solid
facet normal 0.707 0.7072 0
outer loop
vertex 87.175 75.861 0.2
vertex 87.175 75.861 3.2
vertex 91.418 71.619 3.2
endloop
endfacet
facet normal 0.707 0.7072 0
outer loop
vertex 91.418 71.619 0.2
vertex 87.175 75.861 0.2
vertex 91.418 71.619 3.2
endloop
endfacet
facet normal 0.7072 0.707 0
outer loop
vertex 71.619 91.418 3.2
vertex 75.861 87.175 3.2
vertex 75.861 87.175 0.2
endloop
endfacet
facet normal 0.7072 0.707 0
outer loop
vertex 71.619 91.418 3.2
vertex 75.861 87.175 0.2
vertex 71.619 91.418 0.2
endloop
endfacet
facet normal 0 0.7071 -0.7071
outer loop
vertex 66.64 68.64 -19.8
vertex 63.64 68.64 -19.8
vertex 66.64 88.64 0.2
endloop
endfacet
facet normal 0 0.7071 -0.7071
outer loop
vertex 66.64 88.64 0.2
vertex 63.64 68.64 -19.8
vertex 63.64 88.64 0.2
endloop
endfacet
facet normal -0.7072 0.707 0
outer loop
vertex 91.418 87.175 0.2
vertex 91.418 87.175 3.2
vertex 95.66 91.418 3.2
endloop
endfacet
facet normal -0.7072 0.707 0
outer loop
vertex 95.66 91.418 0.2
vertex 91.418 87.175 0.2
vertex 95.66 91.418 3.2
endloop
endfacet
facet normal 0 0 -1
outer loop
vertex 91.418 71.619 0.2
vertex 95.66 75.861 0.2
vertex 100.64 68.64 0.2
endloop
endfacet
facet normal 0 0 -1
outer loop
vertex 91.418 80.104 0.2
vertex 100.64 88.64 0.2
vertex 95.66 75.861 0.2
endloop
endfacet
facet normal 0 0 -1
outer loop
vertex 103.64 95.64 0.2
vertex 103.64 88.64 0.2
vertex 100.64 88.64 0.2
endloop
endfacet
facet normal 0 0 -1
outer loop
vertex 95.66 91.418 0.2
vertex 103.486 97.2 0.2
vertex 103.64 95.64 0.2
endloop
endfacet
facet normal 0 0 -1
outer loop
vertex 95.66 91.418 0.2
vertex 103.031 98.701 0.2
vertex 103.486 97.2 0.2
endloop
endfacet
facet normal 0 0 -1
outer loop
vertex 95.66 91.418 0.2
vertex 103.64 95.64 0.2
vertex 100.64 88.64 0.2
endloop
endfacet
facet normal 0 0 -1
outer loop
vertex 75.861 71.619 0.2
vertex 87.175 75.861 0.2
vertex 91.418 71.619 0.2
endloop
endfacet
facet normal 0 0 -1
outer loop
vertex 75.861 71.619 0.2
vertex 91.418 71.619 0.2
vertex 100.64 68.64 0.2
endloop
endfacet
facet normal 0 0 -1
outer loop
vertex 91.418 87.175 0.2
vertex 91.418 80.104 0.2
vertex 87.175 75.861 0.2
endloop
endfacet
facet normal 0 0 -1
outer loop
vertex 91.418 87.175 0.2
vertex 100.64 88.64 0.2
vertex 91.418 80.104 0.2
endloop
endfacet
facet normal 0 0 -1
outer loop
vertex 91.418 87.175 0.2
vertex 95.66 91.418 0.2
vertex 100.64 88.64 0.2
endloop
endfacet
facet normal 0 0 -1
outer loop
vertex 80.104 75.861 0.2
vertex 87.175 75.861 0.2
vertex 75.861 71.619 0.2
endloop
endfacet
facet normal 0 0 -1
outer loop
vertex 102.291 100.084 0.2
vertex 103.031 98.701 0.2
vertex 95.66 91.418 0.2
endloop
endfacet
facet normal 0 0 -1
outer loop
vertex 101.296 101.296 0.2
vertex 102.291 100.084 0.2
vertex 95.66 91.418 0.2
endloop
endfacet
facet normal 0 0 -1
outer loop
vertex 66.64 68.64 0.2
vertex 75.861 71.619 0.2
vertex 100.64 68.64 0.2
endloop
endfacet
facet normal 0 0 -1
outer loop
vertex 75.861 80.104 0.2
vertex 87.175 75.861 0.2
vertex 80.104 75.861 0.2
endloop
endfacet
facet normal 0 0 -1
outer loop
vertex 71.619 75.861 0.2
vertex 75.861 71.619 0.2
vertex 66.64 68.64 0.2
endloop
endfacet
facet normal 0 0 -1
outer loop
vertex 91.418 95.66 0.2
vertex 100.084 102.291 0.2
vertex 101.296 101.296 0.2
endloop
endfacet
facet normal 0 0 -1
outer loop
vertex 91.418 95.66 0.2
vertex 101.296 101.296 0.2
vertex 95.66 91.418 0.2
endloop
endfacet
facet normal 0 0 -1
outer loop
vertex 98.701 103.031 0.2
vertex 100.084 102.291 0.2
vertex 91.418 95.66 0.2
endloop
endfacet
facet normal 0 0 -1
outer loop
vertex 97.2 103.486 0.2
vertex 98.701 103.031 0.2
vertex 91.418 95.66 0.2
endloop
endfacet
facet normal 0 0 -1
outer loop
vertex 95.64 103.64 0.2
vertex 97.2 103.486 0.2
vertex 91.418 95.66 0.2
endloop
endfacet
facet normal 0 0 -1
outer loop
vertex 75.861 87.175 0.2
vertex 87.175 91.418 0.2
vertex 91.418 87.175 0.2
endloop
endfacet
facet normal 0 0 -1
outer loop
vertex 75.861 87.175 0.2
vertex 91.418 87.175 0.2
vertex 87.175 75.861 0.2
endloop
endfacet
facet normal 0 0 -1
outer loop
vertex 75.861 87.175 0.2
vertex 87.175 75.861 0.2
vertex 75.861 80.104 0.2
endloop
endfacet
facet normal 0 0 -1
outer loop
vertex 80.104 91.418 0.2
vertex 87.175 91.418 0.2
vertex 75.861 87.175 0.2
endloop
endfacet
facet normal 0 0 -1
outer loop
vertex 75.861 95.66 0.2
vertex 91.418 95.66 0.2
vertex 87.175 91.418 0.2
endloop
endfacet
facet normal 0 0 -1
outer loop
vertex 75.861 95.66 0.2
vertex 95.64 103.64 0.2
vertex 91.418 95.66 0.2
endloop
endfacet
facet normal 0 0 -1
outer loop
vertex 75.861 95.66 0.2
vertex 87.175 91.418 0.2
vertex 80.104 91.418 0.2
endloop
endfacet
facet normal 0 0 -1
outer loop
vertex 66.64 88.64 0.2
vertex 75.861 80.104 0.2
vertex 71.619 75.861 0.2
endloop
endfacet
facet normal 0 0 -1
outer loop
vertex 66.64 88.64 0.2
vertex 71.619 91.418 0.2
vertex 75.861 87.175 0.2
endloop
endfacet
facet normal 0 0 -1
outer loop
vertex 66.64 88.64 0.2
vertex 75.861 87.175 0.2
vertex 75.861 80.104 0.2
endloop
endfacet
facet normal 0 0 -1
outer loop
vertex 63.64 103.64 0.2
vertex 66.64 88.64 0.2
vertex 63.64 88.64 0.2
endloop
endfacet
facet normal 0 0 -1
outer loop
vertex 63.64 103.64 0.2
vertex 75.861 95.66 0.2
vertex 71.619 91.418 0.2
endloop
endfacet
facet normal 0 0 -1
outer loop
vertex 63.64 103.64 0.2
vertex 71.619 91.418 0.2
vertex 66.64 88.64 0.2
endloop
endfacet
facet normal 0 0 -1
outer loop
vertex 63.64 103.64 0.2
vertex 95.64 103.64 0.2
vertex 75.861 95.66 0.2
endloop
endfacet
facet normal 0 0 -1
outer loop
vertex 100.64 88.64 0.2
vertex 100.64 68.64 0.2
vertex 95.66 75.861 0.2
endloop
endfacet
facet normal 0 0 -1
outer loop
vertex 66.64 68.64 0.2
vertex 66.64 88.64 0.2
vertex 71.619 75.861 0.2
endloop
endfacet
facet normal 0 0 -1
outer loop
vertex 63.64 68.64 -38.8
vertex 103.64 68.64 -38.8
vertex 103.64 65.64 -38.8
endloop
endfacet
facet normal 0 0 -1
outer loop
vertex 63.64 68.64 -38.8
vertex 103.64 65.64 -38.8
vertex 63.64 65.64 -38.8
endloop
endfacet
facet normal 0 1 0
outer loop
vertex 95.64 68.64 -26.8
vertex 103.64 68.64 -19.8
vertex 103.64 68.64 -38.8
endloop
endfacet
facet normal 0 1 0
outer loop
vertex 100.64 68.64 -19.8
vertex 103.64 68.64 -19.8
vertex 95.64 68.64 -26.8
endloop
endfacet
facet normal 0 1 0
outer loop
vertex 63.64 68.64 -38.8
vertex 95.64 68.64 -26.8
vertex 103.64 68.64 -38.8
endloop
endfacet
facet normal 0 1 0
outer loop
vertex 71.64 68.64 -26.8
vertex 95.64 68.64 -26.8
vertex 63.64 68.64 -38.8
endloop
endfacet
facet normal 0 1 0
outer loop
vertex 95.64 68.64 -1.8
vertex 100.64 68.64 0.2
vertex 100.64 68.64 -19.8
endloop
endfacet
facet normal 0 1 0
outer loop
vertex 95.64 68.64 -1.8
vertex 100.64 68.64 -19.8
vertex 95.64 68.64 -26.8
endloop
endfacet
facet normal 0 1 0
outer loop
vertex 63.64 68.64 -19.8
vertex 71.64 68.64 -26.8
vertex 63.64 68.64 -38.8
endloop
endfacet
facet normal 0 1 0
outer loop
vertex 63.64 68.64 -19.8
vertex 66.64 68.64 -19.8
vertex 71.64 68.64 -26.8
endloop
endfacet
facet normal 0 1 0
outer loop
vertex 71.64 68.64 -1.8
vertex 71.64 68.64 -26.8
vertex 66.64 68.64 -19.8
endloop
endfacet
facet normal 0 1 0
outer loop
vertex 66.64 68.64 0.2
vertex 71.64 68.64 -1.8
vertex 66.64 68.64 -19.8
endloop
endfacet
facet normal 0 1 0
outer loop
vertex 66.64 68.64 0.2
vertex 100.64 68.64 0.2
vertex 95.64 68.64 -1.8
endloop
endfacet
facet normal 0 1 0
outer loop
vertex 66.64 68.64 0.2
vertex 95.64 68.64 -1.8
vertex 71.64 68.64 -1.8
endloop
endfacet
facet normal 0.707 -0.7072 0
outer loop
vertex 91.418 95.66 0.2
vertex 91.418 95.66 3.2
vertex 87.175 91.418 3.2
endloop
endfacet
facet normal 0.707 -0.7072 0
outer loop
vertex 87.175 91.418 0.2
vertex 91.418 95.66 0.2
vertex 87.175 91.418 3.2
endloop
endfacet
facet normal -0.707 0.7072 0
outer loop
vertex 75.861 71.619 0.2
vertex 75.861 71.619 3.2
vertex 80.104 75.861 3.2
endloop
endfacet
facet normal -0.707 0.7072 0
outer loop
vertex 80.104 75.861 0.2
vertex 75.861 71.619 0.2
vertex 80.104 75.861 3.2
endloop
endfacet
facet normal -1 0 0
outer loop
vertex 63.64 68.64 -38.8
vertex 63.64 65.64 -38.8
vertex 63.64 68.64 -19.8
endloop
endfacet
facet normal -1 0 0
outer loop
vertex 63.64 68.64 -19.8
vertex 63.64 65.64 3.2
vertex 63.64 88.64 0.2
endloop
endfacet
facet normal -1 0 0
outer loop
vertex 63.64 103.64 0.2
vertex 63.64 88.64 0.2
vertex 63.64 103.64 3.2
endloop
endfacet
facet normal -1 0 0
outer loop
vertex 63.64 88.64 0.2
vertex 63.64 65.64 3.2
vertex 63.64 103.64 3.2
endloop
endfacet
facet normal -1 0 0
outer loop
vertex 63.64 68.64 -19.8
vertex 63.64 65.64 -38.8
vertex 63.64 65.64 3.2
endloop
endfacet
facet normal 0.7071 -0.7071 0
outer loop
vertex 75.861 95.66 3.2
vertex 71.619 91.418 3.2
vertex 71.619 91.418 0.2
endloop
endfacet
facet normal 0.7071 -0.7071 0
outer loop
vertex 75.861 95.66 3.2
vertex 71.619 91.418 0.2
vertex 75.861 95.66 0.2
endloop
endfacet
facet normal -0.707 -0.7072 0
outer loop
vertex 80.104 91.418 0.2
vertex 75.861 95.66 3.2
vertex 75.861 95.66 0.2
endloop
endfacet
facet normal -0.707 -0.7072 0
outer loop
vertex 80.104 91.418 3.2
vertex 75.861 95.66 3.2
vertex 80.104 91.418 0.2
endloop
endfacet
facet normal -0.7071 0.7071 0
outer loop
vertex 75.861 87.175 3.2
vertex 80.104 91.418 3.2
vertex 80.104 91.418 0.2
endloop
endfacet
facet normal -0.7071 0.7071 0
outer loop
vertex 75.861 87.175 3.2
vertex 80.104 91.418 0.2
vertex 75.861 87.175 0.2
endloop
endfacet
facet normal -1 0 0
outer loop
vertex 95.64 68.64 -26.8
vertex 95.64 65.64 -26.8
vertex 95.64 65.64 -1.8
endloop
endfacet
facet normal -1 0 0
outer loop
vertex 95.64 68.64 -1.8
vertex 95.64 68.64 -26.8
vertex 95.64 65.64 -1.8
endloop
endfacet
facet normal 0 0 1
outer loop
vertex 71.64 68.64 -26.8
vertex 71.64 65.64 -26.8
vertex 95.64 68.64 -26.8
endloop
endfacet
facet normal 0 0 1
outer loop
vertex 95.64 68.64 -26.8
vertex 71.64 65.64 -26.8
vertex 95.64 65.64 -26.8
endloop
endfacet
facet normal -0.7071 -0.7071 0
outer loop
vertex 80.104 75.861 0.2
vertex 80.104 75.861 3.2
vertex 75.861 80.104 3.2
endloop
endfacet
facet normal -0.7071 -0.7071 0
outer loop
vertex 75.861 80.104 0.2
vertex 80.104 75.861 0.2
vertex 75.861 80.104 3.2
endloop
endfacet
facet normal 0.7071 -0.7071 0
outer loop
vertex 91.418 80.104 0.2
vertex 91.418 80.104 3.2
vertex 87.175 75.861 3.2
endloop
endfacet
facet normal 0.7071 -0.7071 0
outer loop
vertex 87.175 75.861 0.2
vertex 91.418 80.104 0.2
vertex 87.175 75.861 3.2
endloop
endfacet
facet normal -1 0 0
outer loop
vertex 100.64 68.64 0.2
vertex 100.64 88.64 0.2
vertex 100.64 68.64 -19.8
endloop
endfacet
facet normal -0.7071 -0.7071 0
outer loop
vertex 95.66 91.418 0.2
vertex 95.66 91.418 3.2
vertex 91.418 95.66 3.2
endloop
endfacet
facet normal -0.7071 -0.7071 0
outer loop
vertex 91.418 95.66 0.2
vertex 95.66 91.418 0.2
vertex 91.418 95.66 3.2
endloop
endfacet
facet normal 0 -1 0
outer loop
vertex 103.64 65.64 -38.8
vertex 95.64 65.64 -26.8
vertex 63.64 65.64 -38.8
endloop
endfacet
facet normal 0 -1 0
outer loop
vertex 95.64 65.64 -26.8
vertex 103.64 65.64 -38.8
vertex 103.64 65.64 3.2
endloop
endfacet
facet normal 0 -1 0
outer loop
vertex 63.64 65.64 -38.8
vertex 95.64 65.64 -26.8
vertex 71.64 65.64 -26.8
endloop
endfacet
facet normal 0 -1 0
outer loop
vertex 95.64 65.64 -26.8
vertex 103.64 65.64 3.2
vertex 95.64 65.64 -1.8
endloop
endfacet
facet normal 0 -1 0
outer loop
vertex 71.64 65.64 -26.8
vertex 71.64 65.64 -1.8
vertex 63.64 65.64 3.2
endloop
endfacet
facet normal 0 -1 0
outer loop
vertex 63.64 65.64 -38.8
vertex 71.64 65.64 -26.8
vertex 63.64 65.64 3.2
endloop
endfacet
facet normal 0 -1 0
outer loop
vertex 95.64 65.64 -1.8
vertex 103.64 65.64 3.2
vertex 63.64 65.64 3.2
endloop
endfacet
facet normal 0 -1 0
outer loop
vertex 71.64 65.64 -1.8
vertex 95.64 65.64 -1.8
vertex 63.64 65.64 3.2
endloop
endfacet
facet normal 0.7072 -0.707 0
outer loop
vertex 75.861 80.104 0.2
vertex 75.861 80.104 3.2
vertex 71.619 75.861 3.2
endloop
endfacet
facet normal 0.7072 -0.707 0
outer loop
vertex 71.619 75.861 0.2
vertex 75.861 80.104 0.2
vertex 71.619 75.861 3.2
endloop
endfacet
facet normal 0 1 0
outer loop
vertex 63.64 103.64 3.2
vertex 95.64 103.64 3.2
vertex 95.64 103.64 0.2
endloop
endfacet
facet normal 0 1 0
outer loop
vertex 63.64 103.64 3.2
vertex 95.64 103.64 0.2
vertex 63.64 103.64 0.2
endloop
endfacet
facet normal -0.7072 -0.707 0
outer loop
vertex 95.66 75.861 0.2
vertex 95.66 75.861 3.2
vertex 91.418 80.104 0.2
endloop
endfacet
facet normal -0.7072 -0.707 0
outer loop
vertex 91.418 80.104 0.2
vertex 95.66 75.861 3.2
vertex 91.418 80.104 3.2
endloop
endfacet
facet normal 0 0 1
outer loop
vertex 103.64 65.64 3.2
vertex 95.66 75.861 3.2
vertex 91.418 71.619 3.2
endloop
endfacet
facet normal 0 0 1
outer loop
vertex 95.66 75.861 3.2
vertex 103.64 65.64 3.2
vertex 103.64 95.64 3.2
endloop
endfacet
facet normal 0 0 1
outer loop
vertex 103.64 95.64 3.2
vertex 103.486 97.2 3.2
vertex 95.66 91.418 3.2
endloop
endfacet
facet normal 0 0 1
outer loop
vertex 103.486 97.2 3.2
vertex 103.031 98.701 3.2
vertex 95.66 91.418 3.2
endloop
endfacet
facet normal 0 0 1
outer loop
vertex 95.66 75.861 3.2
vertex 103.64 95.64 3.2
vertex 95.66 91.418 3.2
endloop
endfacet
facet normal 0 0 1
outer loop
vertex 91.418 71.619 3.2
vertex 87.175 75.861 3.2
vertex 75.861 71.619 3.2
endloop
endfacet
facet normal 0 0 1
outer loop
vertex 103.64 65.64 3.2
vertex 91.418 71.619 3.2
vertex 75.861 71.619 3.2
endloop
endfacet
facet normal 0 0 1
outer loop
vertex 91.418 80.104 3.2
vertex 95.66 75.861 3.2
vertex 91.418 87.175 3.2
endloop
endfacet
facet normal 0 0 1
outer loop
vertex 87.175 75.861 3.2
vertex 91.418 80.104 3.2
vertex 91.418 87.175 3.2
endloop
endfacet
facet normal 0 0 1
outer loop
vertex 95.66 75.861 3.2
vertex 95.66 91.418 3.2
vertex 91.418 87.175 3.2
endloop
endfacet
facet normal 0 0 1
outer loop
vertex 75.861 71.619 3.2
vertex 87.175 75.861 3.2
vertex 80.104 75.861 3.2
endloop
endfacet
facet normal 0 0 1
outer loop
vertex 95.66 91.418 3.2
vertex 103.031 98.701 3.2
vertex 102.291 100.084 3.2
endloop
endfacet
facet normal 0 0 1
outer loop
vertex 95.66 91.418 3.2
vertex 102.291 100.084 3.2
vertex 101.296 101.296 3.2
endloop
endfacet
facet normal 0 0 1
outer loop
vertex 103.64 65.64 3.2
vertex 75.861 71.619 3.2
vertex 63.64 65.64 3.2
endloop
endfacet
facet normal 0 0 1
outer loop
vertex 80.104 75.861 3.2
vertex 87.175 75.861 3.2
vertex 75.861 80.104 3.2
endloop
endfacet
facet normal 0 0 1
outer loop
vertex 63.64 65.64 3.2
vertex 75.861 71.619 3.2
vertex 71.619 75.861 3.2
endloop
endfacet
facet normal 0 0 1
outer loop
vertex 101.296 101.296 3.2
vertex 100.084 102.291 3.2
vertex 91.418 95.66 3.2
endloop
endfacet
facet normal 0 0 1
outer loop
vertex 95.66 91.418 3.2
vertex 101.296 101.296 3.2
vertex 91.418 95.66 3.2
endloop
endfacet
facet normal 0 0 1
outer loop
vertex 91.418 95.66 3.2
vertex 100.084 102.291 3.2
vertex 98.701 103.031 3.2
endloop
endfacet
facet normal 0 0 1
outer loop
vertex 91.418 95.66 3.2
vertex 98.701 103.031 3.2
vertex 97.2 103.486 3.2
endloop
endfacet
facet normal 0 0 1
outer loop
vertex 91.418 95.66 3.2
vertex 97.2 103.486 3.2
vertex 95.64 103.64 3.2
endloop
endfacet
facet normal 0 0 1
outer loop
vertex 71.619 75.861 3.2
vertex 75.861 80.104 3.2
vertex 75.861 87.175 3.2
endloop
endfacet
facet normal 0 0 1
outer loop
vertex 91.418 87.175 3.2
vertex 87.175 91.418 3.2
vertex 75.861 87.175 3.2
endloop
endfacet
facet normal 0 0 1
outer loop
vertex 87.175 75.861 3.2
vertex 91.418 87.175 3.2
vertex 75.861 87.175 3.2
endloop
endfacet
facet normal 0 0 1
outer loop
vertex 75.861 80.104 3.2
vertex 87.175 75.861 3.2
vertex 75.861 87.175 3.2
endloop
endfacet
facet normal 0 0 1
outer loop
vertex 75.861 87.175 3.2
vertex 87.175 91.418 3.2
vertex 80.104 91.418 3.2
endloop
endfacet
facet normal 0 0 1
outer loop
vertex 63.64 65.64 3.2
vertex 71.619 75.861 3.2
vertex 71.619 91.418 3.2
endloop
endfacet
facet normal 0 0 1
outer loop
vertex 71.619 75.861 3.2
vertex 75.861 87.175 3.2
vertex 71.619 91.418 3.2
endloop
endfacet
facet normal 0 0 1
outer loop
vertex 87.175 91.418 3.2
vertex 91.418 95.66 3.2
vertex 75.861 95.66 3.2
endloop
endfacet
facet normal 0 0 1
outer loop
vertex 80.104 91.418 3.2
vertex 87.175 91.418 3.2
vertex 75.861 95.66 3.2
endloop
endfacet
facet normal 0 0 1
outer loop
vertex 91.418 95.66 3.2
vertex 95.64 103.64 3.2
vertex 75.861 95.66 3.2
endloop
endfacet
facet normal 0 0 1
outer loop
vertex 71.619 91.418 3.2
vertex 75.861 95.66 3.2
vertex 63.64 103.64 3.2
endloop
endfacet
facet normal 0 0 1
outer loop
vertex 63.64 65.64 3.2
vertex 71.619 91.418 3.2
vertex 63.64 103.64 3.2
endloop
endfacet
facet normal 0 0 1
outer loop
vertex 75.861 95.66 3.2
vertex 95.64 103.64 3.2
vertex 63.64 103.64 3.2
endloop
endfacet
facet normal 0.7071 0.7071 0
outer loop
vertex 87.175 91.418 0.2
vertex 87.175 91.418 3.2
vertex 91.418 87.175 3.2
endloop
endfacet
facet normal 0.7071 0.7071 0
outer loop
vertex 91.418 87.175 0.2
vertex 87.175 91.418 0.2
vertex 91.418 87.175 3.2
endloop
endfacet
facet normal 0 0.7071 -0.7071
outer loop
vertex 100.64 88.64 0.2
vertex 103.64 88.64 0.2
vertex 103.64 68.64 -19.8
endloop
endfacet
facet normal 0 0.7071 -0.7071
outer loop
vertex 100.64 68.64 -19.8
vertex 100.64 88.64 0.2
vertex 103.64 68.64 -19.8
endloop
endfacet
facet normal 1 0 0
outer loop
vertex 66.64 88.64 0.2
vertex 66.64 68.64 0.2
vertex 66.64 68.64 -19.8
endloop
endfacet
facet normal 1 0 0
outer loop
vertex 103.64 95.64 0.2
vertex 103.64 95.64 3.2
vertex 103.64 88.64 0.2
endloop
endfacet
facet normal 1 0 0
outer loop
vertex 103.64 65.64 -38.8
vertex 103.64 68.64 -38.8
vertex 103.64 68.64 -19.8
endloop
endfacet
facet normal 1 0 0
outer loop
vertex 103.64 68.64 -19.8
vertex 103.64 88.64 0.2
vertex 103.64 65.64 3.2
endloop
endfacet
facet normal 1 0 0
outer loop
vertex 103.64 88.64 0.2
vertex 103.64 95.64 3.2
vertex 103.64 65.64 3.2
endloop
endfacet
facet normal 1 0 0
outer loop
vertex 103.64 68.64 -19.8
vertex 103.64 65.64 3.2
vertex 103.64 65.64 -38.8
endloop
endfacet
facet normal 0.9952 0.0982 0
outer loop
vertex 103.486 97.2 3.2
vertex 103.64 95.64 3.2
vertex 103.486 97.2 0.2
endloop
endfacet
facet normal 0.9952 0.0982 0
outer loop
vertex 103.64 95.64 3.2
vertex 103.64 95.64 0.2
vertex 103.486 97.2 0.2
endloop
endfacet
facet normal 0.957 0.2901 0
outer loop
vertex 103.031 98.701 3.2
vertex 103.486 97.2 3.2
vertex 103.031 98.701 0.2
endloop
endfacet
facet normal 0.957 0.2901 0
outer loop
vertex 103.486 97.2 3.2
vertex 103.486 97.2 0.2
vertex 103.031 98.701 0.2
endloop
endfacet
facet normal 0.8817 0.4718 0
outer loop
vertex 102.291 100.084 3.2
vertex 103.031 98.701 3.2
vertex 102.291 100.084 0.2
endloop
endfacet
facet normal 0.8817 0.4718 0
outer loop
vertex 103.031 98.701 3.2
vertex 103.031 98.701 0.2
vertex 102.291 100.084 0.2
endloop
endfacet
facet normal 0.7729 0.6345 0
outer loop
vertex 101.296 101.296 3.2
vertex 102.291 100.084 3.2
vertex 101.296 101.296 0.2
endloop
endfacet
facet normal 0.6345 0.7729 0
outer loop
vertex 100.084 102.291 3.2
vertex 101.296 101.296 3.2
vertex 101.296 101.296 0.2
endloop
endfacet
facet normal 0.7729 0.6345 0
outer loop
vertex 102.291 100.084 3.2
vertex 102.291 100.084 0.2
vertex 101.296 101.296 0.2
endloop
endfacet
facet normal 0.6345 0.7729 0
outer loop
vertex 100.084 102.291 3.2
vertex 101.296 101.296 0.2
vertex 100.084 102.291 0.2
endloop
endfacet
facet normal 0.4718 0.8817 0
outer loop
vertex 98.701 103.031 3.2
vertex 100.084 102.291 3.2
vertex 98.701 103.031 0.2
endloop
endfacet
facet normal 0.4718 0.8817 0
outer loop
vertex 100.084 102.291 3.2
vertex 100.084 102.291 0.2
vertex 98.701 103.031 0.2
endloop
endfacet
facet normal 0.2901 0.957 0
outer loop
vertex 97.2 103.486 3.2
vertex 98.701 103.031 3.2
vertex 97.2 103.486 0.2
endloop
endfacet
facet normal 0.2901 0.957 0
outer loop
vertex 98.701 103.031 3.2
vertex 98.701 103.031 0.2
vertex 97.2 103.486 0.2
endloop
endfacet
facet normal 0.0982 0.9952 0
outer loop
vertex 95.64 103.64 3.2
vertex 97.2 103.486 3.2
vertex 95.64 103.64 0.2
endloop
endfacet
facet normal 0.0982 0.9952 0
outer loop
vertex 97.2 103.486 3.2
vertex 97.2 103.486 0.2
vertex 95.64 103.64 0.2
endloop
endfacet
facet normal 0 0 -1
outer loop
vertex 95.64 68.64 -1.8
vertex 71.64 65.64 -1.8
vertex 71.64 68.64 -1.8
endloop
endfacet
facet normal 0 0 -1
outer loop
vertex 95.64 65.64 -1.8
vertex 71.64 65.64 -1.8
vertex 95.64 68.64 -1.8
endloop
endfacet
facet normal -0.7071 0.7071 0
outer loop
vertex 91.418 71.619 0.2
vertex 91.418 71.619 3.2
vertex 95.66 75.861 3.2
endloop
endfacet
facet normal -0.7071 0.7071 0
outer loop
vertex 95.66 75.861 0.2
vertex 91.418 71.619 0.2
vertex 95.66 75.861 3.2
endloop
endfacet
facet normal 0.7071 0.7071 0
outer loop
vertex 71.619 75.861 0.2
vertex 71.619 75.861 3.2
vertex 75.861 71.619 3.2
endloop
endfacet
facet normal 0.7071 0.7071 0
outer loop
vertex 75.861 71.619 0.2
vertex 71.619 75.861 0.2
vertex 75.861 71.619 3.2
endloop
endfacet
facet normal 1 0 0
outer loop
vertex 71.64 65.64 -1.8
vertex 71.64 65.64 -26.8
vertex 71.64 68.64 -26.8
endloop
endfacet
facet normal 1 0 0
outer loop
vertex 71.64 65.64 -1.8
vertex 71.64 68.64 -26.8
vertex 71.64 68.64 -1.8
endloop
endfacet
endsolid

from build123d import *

# Parameters (mm, degrees)
SKETCH027_W             = 40
SKETCH027_H             = 38
PAD018_DEPTH            = 3
SKETCH028_W             = 40
SKETCH028_H             = 3
PAD019_DEPTH            = 39
SKETCH029_R             = 1.5
SKETCH029_W             = 24
SKETCH029_H             = 25
POCKET009_DEPTH         = 5
POCKET010_DEPTH         = 5
PAD020_DEPTH            = 3
PAD021_DEPTH            = 3
FILLET012_R             = 8
BODY006_PLACEMENT_ANGLE = 180


with BuildPart() as part:
    # Sketch027 (on Face1 of Binder004) → Pad018 (new body)
    with BuildSketch(Plane(origin=(0, 0, 3.2), x_dir=(1, 0, 0), z_dir=(0, 0, -1))):
        with Locations((-83.6396103068, 84.6396103068)):
            Rectangle(SKETCH027_W, SKETCH027_H)
    extrude(amount=PAD018_DEPTH)

    # Sketch028 (on Face6 of Pad018) → Pad019 (join)
    with BuildSketch(Plane(origin=(0, 0, 0.2), x_dir=(1, 0, 0), z_dir=(0, 0, -1))):
        with Locations((-83.6396103068, 67.1396103068)):
            Rectangle(SKETCH028_W, SKETCH028_H)
    extrude(amount=PAD019_DEPTH)

    # Sketch029 (on Face7 of Pad019) → Pocket009 (cut)
    with BuildSketch(Plane(origin=(0, -65.6396103068, 0), x_dir=(-1, 0, 0), z_dir=(0, 1, 0))):
        with Locations((-92.5127987438, -33.2127134049)):
            Circle(SKETCH029_R)
        with Locations((-73.1038955613, -33.2)):
            Circle(SKETCH029_R)
        with Locations((83.6396103068, -14.3)):
            Rectangle(SKETCH029_W, SKETCH029_H)
    extrude(amount=-POCKET009_DEPTH, mode=Mode.SUBTRACT)

    # Sketch030 (on Face4 of Pocket009) → Pocket010 (cut)
    with BuildSketch(Plane.XY.offset(3.2)):
        Polygon((-91.417785, -87.175144), (-95.660426, -91.417785), (-91.417785, -95.660426), (-87.175144, -91.417785), align=None)
        Polygon((-80.104076, -91.417785), (-75.861436, -87.175144), (-71.618795, -91.417785), (-75.861436, -95.660426), align=None)
        Polygon((-91.417785, -80.104076), (-87.175144, -75.861436), (-91.417785, -71.618795), (-95.660426, -75.861436), align=None)
        Polygon((-80.104076, -75.861436), (-75.861436, -80.104076), (-71.618795, -75.861436), (-75.861436, -71.618795), align=None)
    extrude(amount=-POCKET010_DEPTH, mode=Mode.SUBTRACT)

    # Sketch031 (on Face3 of Pocket010) → Pad020 (join)
    with BuildSketch(Plane(origin=(-103.6396103068, 0, 0), x_dir=(0, -1, 0), z_dir=(-1, 0, 0))):
        Polygon((88.6396103068, 0.2), (68.6396103068, -19.8), (68.6396103068, 0.2), align=None)
    extrude(amount=-PAD020_DEPTH)

    # Sketch032 (on Face2 of Pad020) → Pad021 (join)
    with BuildSketch(Plane.YZ.offset(-63.6396103068)):
        Polygon((-88.6396103068, 0.2), (-68.6396103068, 0.2), (-68.6396103068, -19.8), align=None)
    extrude(amount=-PAD021_DEPTH)

    # Fillet012
    fillet012_edges = [part.edges().sort_by_distance(p)[0] for p in [
        (-103.63961, -103.63961, 1.7),
    ]]
    fillet(fillet012_edges, radius=FILLET012_R)


with BuildPart() as part_1:
    # Body006 placement: moved
    add(part.part.rotate(Axis((0, 0, 0), (0, 0, 1)), BODY006_PLACEMENT_ANGLE))


solid = part_1.part
